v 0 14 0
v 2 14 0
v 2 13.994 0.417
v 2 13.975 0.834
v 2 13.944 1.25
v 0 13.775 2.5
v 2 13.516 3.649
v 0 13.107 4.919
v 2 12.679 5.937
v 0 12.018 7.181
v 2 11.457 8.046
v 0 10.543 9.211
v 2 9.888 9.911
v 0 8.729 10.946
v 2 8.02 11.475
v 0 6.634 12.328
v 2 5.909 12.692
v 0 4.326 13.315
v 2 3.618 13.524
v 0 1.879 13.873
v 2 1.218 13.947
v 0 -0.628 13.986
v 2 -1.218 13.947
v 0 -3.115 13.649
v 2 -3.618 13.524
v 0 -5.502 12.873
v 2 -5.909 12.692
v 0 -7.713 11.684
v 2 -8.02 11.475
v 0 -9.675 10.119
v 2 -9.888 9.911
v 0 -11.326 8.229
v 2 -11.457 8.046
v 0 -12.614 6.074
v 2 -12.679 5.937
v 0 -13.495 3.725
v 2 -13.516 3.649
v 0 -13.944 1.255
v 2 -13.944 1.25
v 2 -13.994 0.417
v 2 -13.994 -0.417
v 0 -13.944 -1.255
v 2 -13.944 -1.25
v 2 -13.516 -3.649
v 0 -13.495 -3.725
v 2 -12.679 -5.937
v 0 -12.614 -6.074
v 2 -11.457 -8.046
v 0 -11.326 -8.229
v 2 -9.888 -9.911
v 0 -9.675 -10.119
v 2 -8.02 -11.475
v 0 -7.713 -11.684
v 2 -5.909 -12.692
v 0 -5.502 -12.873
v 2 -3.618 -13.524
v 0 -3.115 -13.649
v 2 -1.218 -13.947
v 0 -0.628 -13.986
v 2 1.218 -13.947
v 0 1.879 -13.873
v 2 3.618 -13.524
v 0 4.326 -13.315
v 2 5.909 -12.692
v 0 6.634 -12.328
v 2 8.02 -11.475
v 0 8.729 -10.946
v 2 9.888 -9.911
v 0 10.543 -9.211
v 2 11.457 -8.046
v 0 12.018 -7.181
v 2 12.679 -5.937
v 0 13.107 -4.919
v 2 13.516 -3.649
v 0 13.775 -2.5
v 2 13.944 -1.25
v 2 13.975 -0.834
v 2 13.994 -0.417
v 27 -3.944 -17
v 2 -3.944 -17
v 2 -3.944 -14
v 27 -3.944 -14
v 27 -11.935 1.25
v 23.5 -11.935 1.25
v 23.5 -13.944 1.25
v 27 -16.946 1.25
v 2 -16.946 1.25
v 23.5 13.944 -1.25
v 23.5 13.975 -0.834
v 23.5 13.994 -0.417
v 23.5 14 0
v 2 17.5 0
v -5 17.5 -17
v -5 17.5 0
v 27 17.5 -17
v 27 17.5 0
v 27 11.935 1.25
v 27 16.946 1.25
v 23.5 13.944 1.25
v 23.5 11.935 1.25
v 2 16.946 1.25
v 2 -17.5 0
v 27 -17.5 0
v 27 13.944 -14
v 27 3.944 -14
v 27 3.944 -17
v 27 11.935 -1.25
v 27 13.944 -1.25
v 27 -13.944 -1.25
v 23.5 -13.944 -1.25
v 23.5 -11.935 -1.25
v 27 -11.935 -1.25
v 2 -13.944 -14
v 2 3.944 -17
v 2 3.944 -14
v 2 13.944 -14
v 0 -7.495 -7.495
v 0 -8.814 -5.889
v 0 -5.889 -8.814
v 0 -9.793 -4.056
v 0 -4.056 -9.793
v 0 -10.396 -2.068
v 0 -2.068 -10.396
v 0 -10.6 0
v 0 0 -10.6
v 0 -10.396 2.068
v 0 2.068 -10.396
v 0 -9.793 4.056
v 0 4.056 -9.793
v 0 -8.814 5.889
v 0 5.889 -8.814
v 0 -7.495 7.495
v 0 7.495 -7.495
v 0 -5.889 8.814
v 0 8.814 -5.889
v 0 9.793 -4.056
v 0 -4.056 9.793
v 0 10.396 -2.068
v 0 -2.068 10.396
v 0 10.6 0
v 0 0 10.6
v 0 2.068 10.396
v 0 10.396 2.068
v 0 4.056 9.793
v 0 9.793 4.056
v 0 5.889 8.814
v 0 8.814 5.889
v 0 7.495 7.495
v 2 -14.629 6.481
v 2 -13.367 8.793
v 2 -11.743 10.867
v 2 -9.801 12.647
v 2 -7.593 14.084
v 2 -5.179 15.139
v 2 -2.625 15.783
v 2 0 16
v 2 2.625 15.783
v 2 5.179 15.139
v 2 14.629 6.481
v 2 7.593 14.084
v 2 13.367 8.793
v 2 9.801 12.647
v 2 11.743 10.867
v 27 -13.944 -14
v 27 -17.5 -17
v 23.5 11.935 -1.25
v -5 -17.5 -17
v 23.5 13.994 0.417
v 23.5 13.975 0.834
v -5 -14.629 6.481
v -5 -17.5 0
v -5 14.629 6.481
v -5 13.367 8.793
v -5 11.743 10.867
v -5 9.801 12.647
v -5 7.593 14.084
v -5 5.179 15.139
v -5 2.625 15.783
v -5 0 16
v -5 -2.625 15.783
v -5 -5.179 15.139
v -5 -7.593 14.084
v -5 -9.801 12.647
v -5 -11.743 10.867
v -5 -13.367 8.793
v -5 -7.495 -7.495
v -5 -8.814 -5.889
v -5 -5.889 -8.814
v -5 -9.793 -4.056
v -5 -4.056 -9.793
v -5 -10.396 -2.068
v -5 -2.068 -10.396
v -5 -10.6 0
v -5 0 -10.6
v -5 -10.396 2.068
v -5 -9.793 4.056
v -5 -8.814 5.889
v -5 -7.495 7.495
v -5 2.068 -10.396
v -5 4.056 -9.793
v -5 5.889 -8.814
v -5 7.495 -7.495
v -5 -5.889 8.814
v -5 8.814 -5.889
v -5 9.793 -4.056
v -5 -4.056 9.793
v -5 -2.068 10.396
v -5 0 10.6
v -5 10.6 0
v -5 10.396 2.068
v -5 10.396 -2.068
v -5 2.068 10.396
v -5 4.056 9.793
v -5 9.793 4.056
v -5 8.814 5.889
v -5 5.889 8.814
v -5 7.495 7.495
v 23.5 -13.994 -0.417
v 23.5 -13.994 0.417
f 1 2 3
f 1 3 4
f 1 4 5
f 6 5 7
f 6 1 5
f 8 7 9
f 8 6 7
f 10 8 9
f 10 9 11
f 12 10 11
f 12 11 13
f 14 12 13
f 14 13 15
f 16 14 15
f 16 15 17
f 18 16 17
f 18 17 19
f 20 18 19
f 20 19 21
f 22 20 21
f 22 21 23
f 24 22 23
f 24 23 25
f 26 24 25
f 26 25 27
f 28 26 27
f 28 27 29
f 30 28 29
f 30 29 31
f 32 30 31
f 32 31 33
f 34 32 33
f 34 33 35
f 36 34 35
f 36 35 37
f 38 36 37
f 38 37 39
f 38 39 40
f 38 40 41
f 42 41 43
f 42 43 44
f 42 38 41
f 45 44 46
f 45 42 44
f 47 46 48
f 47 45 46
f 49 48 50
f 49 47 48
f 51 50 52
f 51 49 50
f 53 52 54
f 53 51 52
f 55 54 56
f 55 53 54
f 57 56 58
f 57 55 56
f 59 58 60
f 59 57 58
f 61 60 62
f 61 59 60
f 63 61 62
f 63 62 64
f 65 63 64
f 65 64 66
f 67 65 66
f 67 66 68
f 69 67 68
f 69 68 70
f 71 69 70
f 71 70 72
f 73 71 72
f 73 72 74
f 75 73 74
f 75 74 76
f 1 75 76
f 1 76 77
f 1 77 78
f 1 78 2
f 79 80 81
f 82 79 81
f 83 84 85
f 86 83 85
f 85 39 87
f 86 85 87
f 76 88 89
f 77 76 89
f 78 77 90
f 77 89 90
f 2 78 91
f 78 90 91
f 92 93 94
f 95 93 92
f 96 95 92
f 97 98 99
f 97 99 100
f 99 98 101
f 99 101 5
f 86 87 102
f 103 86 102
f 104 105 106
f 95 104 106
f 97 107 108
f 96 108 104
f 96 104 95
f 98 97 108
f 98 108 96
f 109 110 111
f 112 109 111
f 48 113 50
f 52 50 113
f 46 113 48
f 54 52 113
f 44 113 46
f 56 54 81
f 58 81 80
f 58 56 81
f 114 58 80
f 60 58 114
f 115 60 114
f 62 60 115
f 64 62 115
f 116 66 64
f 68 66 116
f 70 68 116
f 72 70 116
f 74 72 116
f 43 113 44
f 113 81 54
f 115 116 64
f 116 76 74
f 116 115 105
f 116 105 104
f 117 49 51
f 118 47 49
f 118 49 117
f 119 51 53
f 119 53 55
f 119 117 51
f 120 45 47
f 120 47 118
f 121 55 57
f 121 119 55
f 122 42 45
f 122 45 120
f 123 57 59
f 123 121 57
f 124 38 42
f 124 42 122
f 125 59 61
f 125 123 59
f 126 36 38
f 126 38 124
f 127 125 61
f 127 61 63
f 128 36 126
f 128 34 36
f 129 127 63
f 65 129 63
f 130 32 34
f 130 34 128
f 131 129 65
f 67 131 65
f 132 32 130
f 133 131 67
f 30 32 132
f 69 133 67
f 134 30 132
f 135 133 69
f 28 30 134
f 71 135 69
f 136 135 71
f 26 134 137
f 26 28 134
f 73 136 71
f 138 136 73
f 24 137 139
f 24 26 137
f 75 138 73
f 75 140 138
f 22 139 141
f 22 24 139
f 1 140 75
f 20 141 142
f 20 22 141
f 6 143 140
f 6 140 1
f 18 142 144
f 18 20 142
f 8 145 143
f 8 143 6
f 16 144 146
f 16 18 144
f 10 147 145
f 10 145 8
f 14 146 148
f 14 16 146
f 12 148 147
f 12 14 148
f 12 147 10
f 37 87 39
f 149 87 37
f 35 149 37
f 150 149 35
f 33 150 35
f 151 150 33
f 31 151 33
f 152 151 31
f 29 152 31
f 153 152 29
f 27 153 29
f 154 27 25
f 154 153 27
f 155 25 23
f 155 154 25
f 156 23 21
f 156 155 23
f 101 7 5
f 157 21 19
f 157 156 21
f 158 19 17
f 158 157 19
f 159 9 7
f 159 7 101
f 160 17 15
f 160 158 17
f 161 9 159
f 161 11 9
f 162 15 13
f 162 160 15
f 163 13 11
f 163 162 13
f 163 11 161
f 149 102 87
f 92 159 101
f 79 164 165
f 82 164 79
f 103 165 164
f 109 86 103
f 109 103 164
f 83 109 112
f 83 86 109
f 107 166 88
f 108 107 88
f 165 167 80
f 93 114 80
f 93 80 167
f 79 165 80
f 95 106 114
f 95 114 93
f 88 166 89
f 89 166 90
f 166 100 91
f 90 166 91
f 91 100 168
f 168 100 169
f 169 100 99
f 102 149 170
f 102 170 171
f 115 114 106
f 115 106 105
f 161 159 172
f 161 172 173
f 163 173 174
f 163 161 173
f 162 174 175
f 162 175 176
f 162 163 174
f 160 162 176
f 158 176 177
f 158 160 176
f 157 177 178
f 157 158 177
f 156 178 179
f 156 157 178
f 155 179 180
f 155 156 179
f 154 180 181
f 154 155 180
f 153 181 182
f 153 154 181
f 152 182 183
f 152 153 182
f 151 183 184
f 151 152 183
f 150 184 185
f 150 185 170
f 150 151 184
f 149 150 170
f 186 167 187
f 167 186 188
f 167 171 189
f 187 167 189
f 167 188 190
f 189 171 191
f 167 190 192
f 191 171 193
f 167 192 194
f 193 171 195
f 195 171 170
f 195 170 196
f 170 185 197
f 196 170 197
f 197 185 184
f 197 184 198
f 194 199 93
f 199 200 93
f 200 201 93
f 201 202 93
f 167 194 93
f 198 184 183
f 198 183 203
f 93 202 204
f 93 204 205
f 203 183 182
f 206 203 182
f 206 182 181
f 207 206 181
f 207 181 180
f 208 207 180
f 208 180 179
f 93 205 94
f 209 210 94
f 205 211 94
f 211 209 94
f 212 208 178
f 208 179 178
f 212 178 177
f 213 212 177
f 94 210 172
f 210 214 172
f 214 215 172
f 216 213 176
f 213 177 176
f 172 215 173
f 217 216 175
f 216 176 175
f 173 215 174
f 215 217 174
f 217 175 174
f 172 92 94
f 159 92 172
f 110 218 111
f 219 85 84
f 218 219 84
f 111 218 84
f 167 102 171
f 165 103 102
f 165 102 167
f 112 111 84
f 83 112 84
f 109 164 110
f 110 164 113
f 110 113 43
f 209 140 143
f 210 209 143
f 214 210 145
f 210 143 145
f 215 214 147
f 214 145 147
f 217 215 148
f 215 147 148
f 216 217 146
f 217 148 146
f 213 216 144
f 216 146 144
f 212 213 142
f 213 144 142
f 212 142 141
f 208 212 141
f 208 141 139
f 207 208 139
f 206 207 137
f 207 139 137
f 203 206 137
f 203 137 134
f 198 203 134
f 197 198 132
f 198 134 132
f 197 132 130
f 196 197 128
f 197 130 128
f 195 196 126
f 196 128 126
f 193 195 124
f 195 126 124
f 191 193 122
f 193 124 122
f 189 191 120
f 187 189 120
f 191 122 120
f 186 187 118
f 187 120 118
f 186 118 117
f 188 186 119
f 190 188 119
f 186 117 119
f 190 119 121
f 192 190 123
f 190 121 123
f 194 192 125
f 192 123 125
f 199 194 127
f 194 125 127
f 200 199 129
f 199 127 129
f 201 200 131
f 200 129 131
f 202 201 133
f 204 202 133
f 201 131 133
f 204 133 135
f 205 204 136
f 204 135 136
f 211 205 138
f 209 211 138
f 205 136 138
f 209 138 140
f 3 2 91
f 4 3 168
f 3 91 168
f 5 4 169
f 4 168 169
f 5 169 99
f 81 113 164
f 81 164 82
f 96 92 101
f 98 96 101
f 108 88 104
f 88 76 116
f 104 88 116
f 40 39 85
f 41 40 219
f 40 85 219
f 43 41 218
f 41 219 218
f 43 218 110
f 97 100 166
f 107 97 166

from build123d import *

# Parameters (mm, degrees)
F0_R      = 14
F1_DEPTH  = 2
F3_DEPTH  = 25
F4_R      = 10.6
F5_DEPTH  = 5
F7_R      = 14
F8_DEPTH  = 23.5
F9_W      = 10
F9_H      = 3
F10_DEPTH = 27
F11_DEPTH = 5


with BuildPart() as f1:
    # F0 (on Right) → F1 (new body)
    with BuildSketch(Plane.YZ):
        with BuildLine():
            Line((-17.5, 0), (-17.5, -17))
            Line((-17.5, -17), (0, -17))
            Line((0, -17), (17.5, -17))
            Line((17.5, -17), (17.5, 0))
            Line((17.5, 0), (14.628571, 6.481119))
            ThreePointArc((14.628571, 6.481119), (0, 16), (-14.628571, 6.481119))
            Line((-14.628571, 6.481119), (-17.5, 0))
        make_face()
        Circle(F0_R, mode=Mode.SUBTRACT)
    extrude(amount=F1_DEPTH)

    # F2 (on face) → F3 (join)
    with BuildSketch(Plane.YZ.offset(2)):
        Polygon((-11.934718, -1.25), (-11.934718, 1.25), (-16.946193, 1.25), (-17.5, 0), (-17.5, -17), (-13.944085, -17), (-13.944085, -1.25), align=None)
        Polygon((11.934718, 1.25), (11.934718, -1.25), (13.944085, -1.25), (13.944085, -17), (17.5, -17), (17.5, 0), (16.946193, 1.25), align=None)
    extrude(amount=F3_DEPTH)

    # F4 (on Right) → F5 (join)
    with BuildSketch(Plane.YZ):
        with BuildLine():
            Line((0, -17), (17.5, -17))
            Line((17.5, -17), (17.5, 0))
            Line((17.5, 0), (14.628571, 6.481119))
            ThreePointArc((14.628571, 6.481119), (0, 16), (-14.628571, 6.481119))
            Line((-14.628571, 6.481119), (-17.5, 0))
            Line((-17.5, 0), (-17.5, -17))
            Line((-17.5, -17), (0, -17))
        make_face()
        Circle(F4_R, mode=Mode.SUBTRACT)
    extrude(amount=-F5_DEPTH)

    # F7 (on offset) → F8 (cut)
    with BuildSketch(Plane.YZ.offset(23.5)):
        Circle(F7_R)
    extrude(amount=-F8_DEPTH, mode=Mode.SUBTRACT)

    # F9 (on Right) → F10 (join)
    with BuildSketch(Plane.YZ):
        with Locations((-8.944085, -15.5)):
            Rectangle(F9_W, F9_H)
        with Locations((8.944085, -15.5)):
            Rectangle(F9_W, F9_H)
    extrude(amount=F10_DEPTH)

    # F9 (on Right) → F11 (join)
    with BuildSketch(Plane.YZ):
        with Locations((-8.944085, -15.5)):
            Rectangle(F9_W, F9_H)
        with Locations((8.944085, -15.5)):
            Rectangle(F9_W, F9_H)
    extrude(amount=-F11_DEPTH)


solid = f1.part
